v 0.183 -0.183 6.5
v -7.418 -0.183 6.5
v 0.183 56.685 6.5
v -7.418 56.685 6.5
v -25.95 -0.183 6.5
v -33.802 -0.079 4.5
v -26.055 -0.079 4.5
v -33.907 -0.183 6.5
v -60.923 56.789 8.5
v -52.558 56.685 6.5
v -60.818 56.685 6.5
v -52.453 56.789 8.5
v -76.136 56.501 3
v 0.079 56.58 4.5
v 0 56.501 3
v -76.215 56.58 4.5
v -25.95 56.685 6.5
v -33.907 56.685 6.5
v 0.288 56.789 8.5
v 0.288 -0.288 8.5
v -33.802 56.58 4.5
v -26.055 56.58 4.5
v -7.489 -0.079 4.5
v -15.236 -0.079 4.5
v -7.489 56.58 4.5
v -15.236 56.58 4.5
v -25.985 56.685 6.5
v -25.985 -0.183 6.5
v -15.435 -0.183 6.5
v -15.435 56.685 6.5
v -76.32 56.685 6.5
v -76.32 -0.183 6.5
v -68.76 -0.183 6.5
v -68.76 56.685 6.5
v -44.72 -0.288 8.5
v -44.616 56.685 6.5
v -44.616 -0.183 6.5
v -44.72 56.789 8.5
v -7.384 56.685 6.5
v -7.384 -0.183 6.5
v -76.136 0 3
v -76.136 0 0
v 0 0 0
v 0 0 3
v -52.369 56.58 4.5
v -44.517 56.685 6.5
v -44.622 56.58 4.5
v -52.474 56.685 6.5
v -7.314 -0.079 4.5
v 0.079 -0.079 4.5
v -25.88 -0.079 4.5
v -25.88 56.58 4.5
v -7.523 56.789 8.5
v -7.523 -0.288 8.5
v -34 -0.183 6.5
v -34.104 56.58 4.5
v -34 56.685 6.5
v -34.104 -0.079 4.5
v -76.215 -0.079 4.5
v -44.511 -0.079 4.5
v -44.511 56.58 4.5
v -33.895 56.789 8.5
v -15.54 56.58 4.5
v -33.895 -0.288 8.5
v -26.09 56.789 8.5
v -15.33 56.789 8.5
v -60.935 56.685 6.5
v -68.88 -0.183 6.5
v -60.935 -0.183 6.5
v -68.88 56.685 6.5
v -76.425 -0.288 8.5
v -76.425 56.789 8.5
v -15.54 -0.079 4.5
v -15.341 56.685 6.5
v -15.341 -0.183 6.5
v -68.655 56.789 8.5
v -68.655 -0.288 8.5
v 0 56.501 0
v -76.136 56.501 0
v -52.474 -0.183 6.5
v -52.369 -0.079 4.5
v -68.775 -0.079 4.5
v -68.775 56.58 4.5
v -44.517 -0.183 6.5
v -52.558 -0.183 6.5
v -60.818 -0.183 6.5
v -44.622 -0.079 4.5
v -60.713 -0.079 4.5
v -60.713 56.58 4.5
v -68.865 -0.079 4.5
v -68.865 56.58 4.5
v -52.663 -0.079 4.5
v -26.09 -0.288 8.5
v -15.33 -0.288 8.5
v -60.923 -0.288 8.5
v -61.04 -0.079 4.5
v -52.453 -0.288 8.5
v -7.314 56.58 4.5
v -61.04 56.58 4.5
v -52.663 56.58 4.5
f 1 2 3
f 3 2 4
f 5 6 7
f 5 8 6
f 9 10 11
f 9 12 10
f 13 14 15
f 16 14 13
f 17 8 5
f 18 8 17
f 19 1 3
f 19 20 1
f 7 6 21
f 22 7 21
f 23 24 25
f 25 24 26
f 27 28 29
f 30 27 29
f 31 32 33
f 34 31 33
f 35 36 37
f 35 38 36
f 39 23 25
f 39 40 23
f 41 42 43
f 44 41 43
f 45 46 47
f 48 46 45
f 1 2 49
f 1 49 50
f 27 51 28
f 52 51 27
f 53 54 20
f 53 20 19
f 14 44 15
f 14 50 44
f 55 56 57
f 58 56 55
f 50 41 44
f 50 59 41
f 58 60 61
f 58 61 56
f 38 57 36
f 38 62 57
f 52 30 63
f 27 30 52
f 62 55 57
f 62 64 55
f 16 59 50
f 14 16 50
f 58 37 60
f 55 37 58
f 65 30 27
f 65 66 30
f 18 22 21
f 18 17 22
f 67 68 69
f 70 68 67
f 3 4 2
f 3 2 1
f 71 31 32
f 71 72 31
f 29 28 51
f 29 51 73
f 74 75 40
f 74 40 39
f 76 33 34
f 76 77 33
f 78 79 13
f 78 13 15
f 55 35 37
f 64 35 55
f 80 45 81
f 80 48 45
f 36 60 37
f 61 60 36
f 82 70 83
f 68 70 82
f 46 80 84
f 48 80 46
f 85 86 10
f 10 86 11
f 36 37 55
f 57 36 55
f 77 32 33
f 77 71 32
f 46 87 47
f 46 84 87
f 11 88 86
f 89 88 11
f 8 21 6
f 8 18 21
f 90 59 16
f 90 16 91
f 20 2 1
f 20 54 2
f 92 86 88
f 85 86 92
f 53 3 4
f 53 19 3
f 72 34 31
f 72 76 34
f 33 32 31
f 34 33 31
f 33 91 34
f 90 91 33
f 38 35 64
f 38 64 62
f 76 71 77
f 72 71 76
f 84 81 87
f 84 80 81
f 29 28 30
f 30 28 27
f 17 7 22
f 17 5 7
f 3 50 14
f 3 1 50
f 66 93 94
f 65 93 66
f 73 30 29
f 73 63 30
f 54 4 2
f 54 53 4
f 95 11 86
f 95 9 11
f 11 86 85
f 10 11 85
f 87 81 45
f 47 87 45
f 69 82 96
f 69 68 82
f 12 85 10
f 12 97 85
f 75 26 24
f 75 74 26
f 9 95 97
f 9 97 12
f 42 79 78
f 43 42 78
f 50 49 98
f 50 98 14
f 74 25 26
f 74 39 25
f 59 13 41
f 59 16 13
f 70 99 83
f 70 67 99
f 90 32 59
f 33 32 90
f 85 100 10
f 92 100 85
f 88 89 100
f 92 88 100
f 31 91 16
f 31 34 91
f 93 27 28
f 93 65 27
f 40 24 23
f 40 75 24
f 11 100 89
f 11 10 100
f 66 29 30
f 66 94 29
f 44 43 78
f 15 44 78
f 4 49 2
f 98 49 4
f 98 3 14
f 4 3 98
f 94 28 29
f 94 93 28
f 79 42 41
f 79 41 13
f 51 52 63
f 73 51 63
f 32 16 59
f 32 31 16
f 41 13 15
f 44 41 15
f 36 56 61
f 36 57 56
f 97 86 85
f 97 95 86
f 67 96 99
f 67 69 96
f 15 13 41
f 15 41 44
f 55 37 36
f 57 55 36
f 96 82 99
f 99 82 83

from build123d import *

# Parameters (mm, degrees)
F0_W      = 76.1363953352
F0_H      = 56.5012171865
F1_DEPTH  = 3
F2_W      = 76.1363953352
F2_H      = 56.5012171865
F3_DEPTH  = 1.5
F3_TAPER  = -3
F4_W      = 76.293618673
F4_H      = 56.6584405243
F5_DEPTH  = 2
F5_TAPER  = -3
F6_W      = 7.9422779381
F6_H      = 56.8680716414
F7_DEPTH  = 2
F7_TAPER  = -3
F8_W      = 7.9422742128
F8_H      = 56.8680716414
F9_DEPTH  = 2
F9_TAPER  = -3
F10_W     = 8.0143567175
F10_H     = 56.8680716414
F11_DEPTH = 2
F11_TAPER = -3
F12_W     = 8.0169183202
F12_H     = 56.8680716414
F13_DEPTH = 2
F13_TAPER = -3
F14_W     = 7.5598000417
F14_H     = 56.8680716414
F15_DEPTH = 2
F15_TAPER = -3
F16_W     = 8.2599669695
F16_H     = 56.8680716414
F17_DEPTH = 2
F17_TAPER = -3
F18_W     = 7.7349804342
F18_H     = 56.6584405243
F19_DEPTH = 2
F19_TAPER = -3
F20_W     = 7.7472105622
F20_H     = 56.6584405243
F21_DEPTH = 2
F21_TAPER = -3
F22_W     = 10.6159038842
F22_H     = 56.8680716414
F23_DEPTH = 2
F23_TAPER = -3
F24_W     = 7.7472124249
F24_H     = 56.6584405243
F25_DEPTH = 2
F25_TAPER = -3
F26_W     = 10.5499308556
F26_H     = 56.8680716414
F27_DEPTH = 2
F27_TAPER = -3
F28_W     = 7.7472133562
F28_H     = 56.6584405243
F29_DEPTH = 2
F29_TAPER = -3
F30_W     = 7.6018208506
F30_H     = 56.8680716414
F31_DEPTH = 2
F31_TAPER = -3


with BuildPart() as f1:
    # F0 (on Top) → F1 (new body)
    with BuildSketch(Plane.XY):
        with Locations((-38.0681976676, 28.2506085932)):
            Rectangle(F0_W, F0_H)
    extrude(amount=F1_DEPTH)


with BuildPart() as f3:
    # F2 (on face) → F3 (new body)
    with BuildSketch(Plane.XY.offset(3)):
        with Locations((-38.0681976676, 28.2506085932)):
            Rectangle(F2_W, F2_H)
    extrude(amount=F3_DEPTH, taper=F3_TAPER)


with BuildPart() as f5:
    # F4 (on face) → F5 (new body)
    with BuildSketch(Plane.XY.offset(4.5)):
        with Locations((-38.0681976676, 28.2506085932)):
            Rectangle(F4_W, F4_H)
    extrude(amount=F5_DEPTH, taper=F5_TAPER)

    # F6 (on face) → F7 (cut)
    with BuildSketch(Plane.XY.offset(6.5)):
        with Locations((-64.788883552, 28.2506085932)):
            Rectangle(F6_W, F6_H)
    extrude(amount=-F7_DEPTH, taper=F7_TAPER, mode=Mode.SUBTRACT)

    # F8 (on face) → F9 (cut)
    with BuildSketch(Plane.XY.offset(6.5)):
        with Locations((-48.586640507, 28.2506085932)):
            Rectangle(F8_W, F8_H)
    extrude(amount=-F9_DEPTH, taper=F9_TAPER, mode=Mode.SUBTRACT)

    # F10 (on face) → F11 (cut)
    with BuildSketch(Plane.XY.offset(6.5)):
        with Locations((-29.9924211577, 28.2506085932)):
            Rectangle(F10_W, F10_H)
    extrude(amount=-F11_DEPTH, taper=F11_TAPER, mode=Mode.SUBTRACT)

    # F12 (on face) → F13 (cut)
    with BuildSketch(Plane.XY.offset(6.5)):
        with Locations((-11.4268527832, 28.2506085932)):
            Rectangle(F12_W, F12_H)
    extrude(amount=-F13_DEPTH, taper=F13_TAPER, mode=Mode.SUBTRACT)


with BuildPart() as f15:
    # F14 (on face) → F15 (new body)
    with BuildSketch(Plane.XY.offset(6.5)):
        with Locations((-72.5399225419, 28.2506085932)):
            Rectangle(F14_W, F14_H)
    extrude(amount=F15_DEPTH, taper=F15_TAPER)


with BuildPart() as f17:
    # F16 (on face) → F17 (new body)
    with BuildSketch(Plane.XY.offset(6.5)):
        with Locations((-56.6877610981, 28.2506085932)):
            Rectangle(F16_W, F16_H)
    extrude(amount=F17_DEPTH, taper=F17_TAPER)


with BuildPart() as f19:
    # F18 (on face) → F19 (new body)
    with BuildSketch(Plane.XY.offset(4.5)):
        with Locations((-64.9076793343, 28.2506085932)):
            Rectangle(F18_W, F18_H)
    extrude(amount=F19_DEPTH, taper=F19_TAPER)


with BuildPart() as f21:
    # F20 (on face) → F21 (new body)
    with BuildSketch(Plane.XY.offset(4.5)):
        with Locations((-48.4954491258, 28.2506085932)):
            Rectangle(F20_W, F20_H)
    extrude(amount=F21_DEPTH, taper=F21_TAPER)


with BuildPart() as f23:
    # F22 (on face) → F23 (new body)
    with BuildSketch(Plane.XY.offset(6.5)):
        with Locations((-39.3075514585, 28.2506085932)):
            Rectangle(F22_W, F22_H)
    extrude(amount=F23_DEPTH, taper=F23_TAPER)


with BuildPart() as f25:
    # F24 (on face) → F25 (new body)
    with BuildSketch(Plane.XY.offset(4.5)):
        with Locations((-29.9288546667, 28.2506085932)):
            Rectangle(F24_W, F24_H)
    extrude(amount=F25_DEPTH, taper=F25_TAPER)


with BuildPart() as f27:
    # F26 (on face) → F27 (new body)
    with BuildSketch(Plane.XY.offset(6.5)):
        with Locations((-20.7102773711, 28.2506085932)):
            Rectangle(F26_W, F26_H)
    extrude(amount=F27_DEPTH, taper=F27_TAPER)


with BuildPart() as f29:
    # F28 (on face) → F29 (new body)
    with BuildSketch(Plane.XY.offset(4.5)):
        with Locations((-11.3622588105, 28.2506085932)):
            Rectangle(F28_W, F28_H)
    extrude(amount=F29_DEPTH, taper=F29_TAPER)


with BuildPart() as f31:
    # F30 (on face) → F31 (new body)
    with BuildSketch(Plane.XY.offset(6.5)):
        with Locations((-3.6174831978, 28.2506085932)):
            Rectangle(F30_W, F30_H)
    extrude(amount=F31_DEPTH, taper=F31_TAPER)


solid = Compound([f1.part, f3.part, f5.part, f15.part, f17.part, f19.part, f21.part, f23.part, f25.part, f27.part, f29.part, f31.part])
